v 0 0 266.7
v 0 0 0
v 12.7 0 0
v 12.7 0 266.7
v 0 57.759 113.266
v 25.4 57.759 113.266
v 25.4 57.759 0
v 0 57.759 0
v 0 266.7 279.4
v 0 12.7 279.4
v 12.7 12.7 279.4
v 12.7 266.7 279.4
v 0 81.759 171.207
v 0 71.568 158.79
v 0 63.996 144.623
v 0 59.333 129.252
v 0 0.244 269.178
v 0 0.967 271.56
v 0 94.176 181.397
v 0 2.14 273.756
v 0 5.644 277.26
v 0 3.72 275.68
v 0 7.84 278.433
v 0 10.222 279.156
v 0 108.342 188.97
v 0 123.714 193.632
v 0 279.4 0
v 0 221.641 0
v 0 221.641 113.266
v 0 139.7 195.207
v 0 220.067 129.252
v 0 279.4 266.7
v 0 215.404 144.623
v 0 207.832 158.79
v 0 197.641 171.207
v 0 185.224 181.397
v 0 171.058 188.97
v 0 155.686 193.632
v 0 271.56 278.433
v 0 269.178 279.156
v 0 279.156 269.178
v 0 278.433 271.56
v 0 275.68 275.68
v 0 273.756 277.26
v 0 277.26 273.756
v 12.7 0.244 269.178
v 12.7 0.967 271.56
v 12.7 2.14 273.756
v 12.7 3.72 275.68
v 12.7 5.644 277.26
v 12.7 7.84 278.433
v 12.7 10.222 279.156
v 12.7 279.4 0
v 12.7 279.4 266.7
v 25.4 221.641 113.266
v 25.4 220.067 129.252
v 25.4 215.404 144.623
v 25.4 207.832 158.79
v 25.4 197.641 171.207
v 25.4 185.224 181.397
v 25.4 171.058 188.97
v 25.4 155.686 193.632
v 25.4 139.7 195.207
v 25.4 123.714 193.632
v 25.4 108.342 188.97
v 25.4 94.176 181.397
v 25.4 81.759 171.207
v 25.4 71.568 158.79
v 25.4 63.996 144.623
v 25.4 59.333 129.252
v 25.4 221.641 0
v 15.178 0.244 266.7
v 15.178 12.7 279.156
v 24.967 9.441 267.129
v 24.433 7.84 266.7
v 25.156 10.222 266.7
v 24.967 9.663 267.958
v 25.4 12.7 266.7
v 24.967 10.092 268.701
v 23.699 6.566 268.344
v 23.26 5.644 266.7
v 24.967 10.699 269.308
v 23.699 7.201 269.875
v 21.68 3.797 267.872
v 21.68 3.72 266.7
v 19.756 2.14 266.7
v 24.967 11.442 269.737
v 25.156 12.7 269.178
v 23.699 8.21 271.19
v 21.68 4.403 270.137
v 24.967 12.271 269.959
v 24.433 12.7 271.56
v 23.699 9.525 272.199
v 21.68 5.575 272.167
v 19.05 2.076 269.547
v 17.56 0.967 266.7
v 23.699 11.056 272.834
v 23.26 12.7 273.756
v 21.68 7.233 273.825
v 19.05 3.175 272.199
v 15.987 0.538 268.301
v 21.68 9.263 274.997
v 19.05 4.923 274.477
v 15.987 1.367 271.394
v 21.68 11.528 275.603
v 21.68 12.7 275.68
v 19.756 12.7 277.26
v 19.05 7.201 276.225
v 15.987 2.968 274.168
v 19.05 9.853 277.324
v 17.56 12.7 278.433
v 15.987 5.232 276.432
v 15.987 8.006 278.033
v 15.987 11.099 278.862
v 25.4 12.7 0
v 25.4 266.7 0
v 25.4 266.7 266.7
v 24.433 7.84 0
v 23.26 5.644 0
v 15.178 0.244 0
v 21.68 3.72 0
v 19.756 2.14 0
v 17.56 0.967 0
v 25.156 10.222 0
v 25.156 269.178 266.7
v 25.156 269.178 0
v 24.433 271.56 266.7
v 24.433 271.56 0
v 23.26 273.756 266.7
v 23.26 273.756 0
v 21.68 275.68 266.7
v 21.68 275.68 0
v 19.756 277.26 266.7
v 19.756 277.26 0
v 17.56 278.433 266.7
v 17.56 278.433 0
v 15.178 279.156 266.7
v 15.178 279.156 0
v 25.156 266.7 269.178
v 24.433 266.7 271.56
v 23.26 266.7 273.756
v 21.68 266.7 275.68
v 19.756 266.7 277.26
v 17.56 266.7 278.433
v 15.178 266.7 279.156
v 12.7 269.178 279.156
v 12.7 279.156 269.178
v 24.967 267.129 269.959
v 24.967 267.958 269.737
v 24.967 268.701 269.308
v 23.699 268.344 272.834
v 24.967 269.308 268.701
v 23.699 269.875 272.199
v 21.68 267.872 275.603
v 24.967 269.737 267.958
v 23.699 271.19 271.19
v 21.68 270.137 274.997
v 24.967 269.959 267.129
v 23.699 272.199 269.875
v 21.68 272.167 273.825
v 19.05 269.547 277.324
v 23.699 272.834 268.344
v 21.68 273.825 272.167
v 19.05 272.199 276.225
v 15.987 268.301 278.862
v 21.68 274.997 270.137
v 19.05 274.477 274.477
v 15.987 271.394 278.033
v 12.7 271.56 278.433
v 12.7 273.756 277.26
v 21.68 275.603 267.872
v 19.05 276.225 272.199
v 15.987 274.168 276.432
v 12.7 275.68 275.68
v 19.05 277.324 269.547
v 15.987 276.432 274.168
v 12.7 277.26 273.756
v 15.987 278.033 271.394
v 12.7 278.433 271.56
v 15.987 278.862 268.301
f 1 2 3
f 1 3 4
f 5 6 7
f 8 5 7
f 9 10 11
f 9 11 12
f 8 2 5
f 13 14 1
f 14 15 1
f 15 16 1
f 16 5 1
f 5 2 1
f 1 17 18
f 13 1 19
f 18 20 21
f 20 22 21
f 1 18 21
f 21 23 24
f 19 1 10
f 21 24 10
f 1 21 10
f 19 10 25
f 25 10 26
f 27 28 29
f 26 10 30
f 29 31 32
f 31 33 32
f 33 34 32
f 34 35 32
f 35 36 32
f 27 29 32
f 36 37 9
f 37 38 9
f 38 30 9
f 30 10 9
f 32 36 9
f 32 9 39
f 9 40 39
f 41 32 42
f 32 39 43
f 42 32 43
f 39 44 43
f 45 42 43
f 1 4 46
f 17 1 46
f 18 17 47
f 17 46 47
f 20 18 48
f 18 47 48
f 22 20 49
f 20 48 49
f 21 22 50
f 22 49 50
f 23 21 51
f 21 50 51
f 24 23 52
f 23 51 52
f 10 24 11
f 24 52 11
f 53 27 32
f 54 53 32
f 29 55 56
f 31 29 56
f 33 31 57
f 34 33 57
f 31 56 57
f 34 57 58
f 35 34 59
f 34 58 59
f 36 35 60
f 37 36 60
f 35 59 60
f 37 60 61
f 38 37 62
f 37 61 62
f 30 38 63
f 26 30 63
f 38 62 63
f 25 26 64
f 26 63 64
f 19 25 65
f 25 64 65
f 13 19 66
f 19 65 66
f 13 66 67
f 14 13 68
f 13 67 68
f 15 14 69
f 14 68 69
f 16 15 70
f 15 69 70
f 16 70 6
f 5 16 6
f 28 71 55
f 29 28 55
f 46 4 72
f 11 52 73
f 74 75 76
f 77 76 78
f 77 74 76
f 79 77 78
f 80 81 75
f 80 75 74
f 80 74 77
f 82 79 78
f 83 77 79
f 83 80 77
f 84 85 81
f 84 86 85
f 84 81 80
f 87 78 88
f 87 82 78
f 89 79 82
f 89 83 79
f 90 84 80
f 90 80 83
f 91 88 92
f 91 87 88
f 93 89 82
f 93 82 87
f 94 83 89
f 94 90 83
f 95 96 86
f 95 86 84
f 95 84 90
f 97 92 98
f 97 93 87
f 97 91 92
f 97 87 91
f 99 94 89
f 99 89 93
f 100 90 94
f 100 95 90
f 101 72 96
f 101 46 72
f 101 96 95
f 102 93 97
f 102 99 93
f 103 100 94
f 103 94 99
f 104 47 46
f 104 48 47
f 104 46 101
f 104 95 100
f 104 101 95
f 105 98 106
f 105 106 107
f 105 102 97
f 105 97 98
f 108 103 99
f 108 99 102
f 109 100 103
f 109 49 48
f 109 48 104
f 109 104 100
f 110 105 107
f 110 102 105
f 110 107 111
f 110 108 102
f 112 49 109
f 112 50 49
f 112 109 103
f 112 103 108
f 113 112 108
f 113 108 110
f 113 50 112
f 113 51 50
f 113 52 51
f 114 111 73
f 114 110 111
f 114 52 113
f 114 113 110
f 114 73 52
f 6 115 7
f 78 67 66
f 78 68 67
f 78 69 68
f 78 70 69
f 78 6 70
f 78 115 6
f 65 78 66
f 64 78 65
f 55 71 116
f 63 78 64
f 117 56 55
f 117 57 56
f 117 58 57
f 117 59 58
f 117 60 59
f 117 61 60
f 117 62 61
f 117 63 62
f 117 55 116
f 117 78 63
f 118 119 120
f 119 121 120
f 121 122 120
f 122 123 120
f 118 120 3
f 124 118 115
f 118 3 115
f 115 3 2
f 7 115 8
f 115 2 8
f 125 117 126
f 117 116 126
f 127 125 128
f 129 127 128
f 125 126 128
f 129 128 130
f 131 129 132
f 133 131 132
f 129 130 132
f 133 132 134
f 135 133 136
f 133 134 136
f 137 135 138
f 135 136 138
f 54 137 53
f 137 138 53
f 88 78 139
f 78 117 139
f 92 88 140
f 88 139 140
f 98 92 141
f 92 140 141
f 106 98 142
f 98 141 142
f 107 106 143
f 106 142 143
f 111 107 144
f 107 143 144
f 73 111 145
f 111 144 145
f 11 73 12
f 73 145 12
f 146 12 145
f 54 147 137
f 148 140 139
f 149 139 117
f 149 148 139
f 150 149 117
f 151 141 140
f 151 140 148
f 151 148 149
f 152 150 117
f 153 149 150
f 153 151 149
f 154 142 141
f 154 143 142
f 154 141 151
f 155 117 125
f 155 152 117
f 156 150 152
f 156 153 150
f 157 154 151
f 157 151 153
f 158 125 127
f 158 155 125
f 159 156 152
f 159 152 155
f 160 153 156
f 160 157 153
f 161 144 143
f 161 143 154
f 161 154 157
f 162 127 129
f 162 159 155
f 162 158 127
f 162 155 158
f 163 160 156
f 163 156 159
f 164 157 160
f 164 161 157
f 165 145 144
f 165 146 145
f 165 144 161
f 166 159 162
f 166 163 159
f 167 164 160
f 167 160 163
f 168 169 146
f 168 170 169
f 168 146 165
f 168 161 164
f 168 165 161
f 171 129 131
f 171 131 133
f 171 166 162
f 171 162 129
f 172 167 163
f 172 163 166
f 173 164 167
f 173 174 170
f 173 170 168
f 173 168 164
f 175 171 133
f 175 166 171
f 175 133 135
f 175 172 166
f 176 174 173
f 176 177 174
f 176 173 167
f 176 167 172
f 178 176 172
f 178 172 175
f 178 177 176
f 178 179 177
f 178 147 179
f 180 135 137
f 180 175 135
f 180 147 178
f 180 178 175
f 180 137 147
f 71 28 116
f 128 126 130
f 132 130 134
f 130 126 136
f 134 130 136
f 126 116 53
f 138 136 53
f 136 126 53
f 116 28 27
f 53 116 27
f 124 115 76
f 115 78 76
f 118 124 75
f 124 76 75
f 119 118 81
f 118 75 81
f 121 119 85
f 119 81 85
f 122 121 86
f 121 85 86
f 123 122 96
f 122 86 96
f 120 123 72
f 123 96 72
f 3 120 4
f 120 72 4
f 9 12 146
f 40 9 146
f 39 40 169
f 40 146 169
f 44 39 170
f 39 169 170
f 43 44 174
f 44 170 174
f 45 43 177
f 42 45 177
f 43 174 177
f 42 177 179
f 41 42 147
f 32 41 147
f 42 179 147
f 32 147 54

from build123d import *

# Parameters (mm, degrees)
F0_W     = 279.4
F0_H     = 279.4
F1_DEPTH = 25.4
F3_DEPTH = 25.4
F4_R     = 12.7
F5_R     = 12.7


with BuildPart() as f1:
    # F0 (on Right) → F1 (new body)
    with BuildSketch(Plane.YZ):
        with Locations((139.7, 139.7)):
            Rectangle(F0_W, F0_H)
    extrude(amount=F1_DEPTH)

    # F2 (on face) → F3 (cut)
    with BuildSketch(Plane.YZ.offset(25.4)):
        with BuildLine():
            Line((221.641318, -113.265621), (221.641318, 113.265621))
            ThreePointArc((221.641318, 113.265621), (139.7, 195.20694), (57.758682, 113.265621))
            Line((57.758682, 113.265621), (57.758682, -113.265621))
            Line((57.758682, -113.265621), (221.641318, -113.265621))
        make_face()
    extrude(amount=-F3_DEPTH, mode=Mode.SUBTRACT)

    # F4
    f4_edges = [f1.edges().sort_by_distance(p)[0] for p in [
        (12.7, 0, 279.4),
        (12.7, 279.4, 279.4),
    ]]
    fillet(f4_edges, radius=F4_R)

    # F5
    f5_edges = [f1.edges().sort_by_distance(p)[0] for p in [
        (25.4, 139.7, 279.4),
    ]]
    fillet(f5_edges, radius=F5_R)


solid = f1.part
